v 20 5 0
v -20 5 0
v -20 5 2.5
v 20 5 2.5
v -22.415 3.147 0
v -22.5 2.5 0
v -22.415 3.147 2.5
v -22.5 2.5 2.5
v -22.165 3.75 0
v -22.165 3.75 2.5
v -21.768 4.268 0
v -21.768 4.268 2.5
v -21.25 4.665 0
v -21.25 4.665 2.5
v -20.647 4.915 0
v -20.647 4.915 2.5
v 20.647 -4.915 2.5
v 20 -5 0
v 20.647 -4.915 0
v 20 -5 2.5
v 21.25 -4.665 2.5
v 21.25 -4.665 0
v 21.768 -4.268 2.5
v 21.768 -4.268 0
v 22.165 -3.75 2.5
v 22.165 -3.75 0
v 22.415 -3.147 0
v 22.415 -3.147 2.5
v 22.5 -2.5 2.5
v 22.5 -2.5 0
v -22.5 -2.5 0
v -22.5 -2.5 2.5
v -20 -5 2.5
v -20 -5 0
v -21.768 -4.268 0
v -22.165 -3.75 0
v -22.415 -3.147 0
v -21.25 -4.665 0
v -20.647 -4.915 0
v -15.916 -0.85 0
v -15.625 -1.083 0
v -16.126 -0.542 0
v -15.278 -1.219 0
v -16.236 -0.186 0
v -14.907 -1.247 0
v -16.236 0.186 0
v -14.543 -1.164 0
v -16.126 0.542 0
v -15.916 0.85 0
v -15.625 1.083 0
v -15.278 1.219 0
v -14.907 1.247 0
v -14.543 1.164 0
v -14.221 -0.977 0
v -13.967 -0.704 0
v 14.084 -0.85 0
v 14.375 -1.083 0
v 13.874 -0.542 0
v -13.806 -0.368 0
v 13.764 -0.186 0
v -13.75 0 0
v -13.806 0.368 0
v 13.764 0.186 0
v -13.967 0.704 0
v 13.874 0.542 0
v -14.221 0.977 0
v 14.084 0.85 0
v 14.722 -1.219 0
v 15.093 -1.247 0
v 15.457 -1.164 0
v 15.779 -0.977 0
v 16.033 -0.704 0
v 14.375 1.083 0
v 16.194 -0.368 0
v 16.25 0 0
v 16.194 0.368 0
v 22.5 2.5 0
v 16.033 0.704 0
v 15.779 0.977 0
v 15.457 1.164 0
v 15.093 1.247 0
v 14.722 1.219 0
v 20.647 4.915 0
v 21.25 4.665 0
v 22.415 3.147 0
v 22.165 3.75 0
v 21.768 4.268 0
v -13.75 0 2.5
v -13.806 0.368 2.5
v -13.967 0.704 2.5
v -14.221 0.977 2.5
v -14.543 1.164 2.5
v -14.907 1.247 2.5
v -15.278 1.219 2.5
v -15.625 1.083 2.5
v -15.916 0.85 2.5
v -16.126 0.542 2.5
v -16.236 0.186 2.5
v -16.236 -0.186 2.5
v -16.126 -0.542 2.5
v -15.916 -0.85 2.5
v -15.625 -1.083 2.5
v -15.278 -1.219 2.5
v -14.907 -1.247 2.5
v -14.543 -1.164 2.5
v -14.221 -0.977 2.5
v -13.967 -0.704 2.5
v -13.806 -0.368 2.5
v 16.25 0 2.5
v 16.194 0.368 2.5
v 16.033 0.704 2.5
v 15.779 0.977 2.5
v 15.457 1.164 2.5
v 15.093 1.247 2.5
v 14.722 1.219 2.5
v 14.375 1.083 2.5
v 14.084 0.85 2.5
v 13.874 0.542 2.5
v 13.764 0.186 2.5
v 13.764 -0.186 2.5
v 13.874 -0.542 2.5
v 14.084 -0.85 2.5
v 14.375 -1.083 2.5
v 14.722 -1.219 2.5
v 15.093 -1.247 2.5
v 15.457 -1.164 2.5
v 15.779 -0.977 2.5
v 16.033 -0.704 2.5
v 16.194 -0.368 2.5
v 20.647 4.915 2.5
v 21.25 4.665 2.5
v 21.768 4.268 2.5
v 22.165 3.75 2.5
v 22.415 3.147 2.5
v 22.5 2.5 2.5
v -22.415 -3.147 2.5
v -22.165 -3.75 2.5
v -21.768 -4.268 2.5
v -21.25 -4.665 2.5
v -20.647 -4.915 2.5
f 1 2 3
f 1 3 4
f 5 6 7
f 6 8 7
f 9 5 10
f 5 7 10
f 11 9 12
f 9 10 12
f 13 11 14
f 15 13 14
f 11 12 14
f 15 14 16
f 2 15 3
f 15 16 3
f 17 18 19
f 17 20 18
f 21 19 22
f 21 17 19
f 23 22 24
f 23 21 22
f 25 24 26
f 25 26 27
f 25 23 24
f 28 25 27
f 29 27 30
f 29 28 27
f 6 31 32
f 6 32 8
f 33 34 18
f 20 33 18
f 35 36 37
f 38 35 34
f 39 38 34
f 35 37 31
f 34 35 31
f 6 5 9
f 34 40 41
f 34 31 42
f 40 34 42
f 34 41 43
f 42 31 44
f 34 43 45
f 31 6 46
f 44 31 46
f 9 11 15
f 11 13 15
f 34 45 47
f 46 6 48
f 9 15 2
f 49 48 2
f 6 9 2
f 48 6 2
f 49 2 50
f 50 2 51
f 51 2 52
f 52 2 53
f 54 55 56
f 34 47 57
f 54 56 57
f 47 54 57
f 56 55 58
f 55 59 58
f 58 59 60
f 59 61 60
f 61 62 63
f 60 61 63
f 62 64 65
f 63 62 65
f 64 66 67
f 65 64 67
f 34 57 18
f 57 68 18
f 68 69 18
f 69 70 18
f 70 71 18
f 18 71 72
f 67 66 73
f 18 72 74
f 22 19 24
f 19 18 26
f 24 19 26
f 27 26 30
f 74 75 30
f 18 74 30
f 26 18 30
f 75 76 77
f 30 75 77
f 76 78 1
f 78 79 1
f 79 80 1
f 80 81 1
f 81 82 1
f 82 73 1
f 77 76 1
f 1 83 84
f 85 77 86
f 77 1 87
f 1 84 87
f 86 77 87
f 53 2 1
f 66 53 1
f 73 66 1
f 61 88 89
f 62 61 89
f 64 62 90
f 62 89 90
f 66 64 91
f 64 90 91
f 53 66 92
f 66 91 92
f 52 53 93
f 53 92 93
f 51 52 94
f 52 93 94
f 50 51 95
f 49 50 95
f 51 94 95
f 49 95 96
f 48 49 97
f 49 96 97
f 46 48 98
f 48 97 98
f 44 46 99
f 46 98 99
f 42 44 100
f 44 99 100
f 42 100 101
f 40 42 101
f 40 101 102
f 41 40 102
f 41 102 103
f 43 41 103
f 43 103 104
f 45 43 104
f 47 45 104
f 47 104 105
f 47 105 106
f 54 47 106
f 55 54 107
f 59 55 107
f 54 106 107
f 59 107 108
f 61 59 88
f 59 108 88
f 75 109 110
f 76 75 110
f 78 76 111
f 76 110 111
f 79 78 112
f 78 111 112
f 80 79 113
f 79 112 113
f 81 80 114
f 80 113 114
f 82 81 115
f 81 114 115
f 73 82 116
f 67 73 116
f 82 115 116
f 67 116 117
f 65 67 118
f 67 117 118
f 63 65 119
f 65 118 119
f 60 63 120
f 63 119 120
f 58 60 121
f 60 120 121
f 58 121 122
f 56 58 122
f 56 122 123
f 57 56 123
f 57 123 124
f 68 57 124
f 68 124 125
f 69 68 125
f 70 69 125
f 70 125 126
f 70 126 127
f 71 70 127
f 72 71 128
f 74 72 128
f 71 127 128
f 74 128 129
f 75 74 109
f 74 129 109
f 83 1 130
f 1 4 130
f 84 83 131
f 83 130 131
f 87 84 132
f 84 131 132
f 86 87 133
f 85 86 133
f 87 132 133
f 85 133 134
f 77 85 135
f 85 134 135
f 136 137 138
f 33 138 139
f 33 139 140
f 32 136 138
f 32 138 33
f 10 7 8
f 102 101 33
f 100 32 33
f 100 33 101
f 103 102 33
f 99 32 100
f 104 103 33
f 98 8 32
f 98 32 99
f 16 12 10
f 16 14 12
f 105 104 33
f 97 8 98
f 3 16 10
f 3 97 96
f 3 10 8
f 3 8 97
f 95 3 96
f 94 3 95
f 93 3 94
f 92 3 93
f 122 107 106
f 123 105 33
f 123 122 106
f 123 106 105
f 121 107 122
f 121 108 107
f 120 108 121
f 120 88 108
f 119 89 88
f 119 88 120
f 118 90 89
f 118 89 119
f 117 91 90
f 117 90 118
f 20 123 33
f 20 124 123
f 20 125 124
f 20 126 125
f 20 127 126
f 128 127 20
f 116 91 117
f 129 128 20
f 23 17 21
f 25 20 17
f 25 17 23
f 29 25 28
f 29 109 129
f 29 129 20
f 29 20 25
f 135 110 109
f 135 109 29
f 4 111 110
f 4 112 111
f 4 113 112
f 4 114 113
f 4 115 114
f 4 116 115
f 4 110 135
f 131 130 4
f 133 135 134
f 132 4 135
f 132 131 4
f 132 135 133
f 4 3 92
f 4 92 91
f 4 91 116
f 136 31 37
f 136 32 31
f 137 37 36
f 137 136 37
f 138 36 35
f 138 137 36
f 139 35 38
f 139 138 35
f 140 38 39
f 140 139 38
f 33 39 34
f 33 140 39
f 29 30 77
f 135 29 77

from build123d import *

# Parameters (mm, degrees)
F0_W     = 90
F0_H     = 20
F1_DEPTH = 5
F2_R     = 2.5
F3_DEPTH = 5
F4_R     = 5
F5_SCALE = 0.5


with BuildPart() as f1:
    # F0 (on Top) → F1 (new body)
    with BuildSketch(Plane.XY):
        Rectangle(F0_W, F0_H)
    extrude(amount=F1_DEPTH)

    # F2 (on face) → F3 (cut)
    with BuildSketch(Plane.XY.offset(5)):
        with Locations((-30, 0)):
            Circle(F2_R)
        with Locations((30, 0)):
            Circle(F2_R)
    extrude(amount=-F3_DEPTH, mode=Mode.SUBTRACT)

    # F4
    f4_edges = [f1.edges().sort_by_distance(p)[0] for p in [
        (-45, 10, 2.5),
        (-45, -10, 2.5),
        (45, -10, 2.5),
        (45, 10, 2.5),
    ]]
    fillet(f4_edges, radius=F4_R)


with BuildPart() as f1_1:
    # F5: moved
    add(f1.part.scale(F5_SCALE))


solid = f1_1.part
